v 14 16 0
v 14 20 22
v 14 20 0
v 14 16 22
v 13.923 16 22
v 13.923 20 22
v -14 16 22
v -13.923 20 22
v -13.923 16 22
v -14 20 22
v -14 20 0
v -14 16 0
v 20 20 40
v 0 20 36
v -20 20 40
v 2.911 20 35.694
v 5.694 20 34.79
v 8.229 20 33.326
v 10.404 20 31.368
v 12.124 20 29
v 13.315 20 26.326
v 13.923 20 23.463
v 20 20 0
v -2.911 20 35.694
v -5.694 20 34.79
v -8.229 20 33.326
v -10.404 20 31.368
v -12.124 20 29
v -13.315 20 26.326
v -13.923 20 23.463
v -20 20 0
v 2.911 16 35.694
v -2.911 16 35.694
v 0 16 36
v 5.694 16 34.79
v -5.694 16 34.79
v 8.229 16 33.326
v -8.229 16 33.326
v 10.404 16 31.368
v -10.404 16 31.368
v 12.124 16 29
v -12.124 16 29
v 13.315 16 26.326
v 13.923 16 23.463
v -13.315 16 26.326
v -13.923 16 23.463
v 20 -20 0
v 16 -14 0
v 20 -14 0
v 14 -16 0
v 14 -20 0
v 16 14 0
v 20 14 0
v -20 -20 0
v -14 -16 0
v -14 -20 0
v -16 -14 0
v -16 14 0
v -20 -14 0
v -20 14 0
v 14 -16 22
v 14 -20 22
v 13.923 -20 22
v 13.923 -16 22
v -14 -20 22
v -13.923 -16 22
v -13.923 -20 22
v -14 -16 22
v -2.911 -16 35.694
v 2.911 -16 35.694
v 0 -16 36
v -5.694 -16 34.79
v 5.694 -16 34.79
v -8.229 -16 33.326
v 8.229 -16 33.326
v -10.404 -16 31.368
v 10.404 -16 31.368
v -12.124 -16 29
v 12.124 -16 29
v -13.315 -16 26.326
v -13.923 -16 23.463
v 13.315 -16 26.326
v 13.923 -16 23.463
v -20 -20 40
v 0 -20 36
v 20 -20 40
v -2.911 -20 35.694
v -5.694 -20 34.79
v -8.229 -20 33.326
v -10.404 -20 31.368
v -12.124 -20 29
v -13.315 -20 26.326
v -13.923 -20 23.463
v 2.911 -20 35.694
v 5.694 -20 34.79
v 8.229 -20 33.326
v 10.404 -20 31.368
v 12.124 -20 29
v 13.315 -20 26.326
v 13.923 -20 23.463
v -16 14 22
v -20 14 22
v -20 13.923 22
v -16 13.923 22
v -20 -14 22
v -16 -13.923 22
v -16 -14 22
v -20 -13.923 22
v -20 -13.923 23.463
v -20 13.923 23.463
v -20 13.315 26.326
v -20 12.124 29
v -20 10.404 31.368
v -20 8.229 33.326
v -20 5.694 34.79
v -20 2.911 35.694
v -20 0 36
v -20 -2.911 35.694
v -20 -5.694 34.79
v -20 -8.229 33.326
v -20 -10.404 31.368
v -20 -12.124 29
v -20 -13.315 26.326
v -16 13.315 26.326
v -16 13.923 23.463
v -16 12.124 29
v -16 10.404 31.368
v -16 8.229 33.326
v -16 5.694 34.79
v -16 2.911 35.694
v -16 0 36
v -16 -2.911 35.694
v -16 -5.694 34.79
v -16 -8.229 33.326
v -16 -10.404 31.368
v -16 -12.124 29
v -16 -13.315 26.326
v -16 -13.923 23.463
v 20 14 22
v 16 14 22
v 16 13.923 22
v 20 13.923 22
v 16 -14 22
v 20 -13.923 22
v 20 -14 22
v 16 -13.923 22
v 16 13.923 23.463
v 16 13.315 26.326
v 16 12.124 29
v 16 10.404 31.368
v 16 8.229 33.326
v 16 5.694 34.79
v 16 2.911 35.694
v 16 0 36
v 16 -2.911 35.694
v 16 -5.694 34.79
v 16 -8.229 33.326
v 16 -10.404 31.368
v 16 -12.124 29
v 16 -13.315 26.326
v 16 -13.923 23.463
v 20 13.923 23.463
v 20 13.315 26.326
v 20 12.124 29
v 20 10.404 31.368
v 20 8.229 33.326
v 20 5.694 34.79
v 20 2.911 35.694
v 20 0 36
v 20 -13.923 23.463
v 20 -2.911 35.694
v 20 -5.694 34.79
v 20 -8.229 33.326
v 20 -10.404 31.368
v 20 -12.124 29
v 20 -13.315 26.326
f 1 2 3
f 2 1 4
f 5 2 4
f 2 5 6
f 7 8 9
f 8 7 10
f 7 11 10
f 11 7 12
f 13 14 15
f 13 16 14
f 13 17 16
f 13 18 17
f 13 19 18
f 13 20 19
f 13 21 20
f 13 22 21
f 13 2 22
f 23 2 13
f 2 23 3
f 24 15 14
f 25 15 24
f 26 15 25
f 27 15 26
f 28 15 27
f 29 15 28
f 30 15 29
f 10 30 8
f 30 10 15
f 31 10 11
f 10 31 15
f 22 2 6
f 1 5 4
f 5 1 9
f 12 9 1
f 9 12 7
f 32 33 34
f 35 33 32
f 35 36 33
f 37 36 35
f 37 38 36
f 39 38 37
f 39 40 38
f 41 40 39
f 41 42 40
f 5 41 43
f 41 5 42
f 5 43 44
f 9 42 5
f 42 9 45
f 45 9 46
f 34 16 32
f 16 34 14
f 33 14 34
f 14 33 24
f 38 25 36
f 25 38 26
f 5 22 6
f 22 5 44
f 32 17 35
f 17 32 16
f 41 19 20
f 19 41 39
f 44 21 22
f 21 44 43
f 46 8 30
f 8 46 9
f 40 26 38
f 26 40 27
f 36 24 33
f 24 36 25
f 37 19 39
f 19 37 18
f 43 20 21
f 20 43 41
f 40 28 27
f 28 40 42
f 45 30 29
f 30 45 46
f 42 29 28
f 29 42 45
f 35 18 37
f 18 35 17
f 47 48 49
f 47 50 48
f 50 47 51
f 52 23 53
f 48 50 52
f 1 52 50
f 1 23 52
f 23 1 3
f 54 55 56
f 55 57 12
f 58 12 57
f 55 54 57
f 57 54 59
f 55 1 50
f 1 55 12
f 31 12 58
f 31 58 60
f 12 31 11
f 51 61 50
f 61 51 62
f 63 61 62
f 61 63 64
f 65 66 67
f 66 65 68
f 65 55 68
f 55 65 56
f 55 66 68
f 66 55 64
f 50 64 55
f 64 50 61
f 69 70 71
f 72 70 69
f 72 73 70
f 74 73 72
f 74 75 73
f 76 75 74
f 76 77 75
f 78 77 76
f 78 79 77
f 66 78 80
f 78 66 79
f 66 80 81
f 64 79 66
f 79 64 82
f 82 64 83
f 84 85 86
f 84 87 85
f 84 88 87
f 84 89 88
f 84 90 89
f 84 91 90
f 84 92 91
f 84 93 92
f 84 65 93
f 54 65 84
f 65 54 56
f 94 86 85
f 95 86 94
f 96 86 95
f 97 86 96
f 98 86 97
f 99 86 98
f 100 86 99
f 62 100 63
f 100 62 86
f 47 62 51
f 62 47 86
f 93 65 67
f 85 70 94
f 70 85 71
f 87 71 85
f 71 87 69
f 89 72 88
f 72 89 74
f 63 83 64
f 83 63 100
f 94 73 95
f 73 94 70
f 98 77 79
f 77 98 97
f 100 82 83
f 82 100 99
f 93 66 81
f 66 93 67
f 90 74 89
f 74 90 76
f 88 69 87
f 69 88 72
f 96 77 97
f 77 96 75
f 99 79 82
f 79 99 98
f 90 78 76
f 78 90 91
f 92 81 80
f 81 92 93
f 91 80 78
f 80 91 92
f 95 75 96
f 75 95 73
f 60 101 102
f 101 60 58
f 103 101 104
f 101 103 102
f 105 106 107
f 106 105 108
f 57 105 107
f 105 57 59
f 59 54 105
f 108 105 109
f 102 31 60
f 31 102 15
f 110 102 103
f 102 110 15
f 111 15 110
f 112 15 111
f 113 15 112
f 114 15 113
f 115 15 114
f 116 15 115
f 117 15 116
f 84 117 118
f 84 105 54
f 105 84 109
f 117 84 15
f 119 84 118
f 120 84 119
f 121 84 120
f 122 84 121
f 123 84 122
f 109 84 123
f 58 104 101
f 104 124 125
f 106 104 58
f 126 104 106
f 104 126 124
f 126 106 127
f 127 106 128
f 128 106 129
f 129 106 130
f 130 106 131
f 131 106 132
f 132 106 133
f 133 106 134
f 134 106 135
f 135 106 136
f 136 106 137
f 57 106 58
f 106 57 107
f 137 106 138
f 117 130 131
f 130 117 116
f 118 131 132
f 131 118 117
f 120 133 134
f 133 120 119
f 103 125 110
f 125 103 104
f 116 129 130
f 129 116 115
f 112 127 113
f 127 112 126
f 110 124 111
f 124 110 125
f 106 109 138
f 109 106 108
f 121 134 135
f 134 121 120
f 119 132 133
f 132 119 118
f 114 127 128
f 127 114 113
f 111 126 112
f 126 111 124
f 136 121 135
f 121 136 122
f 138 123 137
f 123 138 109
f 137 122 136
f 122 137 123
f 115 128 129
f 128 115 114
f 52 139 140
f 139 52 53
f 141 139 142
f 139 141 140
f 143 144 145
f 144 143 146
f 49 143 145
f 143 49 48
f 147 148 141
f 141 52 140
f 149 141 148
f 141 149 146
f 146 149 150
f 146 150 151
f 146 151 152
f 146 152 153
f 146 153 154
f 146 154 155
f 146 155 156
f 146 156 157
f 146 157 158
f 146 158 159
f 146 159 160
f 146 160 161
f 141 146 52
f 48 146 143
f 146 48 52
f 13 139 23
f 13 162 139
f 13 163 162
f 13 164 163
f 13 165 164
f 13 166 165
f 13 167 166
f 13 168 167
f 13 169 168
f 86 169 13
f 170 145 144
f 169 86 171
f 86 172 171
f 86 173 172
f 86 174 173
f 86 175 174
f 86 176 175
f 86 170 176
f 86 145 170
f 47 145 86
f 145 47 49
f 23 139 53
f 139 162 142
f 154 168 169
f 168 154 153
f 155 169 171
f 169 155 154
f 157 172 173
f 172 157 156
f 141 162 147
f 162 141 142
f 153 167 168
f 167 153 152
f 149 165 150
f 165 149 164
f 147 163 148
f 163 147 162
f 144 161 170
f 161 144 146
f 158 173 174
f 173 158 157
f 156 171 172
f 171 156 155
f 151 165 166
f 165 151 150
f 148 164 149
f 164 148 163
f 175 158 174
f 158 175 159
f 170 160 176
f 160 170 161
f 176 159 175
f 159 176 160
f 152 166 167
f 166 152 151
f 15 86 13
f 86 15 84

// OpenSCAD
/*
translate([-20,0,0]) {
    
intersection() {
    cube(15, center=true);
    
    translate([-2,0,0]) {
        sphere(10);
    }
}


}
*/


/*/

 difference(){
    
    cube(100, true);


    translate([-50,0,0]) {
        cube([10,80,100],true);
    }
}


 translate([0,0,50]) {
            cube([10,80,100],true);
        }
/**/

module door(size=[60,10,100]) {
    translate([0,0,size[2]/2]) {
        difference() {
            cube(size,true);
            difference() {
                translate([0,0,size[2]/2-size[0]/4]) {
                    cube([size[0],size[1],size[0]/2],true);
                }
                translate([0,0,size[2]/2-size[0]/2]) {
                    rotate([90,90,0]) {
                        cylinder(h=size[1], r1=size[0]/2, r2=size[0]/2, center=true);
                    }
                }  
            }
        }  
    }
}



module cube_portal(size=[60,60,100], portal=[0.7,.1,0.9]) {
    
    difference() {
                
        translate([0,0,size[2]/2]) { 
            cube(size,true);
        }
            
        union(){
            
            translate([0,(size[1]/2-size[1]*portal[1]/2),0]) { 
                door([
                    size[0]*portal[0],
                    size[1]*portal[1],
                    size[2]*portal[2],
                ]);
            }
            
            translate([0,-(size[1]/2-size[1]*portal[1]/2),0]) { 
                door([
                    size[0]*portal[0],
                    size[1]*portal[1],
                    size[2]*portal[2],
                ]);
            }
            
            rotate([0,0,90]) {
                translate([0,(size[1]/2-size[1]*portal[1]/2),0]) { 
                    door([
                        size[0]*portal[0],
                        size[1]*portal[1],
                        size[2]*portal[2],
                    ]);
                }
                
                translate([0,-(size[1]/2-size[1]*portal[1]/2),0]) { 
                    door([
                        size[0]*portal[0],
                        size[1]*portal[1],
                        size[2]*portal[2],
                    ]);
                }
            }
        
        }
    
    }
}


cube_portal([40,40,40]);
